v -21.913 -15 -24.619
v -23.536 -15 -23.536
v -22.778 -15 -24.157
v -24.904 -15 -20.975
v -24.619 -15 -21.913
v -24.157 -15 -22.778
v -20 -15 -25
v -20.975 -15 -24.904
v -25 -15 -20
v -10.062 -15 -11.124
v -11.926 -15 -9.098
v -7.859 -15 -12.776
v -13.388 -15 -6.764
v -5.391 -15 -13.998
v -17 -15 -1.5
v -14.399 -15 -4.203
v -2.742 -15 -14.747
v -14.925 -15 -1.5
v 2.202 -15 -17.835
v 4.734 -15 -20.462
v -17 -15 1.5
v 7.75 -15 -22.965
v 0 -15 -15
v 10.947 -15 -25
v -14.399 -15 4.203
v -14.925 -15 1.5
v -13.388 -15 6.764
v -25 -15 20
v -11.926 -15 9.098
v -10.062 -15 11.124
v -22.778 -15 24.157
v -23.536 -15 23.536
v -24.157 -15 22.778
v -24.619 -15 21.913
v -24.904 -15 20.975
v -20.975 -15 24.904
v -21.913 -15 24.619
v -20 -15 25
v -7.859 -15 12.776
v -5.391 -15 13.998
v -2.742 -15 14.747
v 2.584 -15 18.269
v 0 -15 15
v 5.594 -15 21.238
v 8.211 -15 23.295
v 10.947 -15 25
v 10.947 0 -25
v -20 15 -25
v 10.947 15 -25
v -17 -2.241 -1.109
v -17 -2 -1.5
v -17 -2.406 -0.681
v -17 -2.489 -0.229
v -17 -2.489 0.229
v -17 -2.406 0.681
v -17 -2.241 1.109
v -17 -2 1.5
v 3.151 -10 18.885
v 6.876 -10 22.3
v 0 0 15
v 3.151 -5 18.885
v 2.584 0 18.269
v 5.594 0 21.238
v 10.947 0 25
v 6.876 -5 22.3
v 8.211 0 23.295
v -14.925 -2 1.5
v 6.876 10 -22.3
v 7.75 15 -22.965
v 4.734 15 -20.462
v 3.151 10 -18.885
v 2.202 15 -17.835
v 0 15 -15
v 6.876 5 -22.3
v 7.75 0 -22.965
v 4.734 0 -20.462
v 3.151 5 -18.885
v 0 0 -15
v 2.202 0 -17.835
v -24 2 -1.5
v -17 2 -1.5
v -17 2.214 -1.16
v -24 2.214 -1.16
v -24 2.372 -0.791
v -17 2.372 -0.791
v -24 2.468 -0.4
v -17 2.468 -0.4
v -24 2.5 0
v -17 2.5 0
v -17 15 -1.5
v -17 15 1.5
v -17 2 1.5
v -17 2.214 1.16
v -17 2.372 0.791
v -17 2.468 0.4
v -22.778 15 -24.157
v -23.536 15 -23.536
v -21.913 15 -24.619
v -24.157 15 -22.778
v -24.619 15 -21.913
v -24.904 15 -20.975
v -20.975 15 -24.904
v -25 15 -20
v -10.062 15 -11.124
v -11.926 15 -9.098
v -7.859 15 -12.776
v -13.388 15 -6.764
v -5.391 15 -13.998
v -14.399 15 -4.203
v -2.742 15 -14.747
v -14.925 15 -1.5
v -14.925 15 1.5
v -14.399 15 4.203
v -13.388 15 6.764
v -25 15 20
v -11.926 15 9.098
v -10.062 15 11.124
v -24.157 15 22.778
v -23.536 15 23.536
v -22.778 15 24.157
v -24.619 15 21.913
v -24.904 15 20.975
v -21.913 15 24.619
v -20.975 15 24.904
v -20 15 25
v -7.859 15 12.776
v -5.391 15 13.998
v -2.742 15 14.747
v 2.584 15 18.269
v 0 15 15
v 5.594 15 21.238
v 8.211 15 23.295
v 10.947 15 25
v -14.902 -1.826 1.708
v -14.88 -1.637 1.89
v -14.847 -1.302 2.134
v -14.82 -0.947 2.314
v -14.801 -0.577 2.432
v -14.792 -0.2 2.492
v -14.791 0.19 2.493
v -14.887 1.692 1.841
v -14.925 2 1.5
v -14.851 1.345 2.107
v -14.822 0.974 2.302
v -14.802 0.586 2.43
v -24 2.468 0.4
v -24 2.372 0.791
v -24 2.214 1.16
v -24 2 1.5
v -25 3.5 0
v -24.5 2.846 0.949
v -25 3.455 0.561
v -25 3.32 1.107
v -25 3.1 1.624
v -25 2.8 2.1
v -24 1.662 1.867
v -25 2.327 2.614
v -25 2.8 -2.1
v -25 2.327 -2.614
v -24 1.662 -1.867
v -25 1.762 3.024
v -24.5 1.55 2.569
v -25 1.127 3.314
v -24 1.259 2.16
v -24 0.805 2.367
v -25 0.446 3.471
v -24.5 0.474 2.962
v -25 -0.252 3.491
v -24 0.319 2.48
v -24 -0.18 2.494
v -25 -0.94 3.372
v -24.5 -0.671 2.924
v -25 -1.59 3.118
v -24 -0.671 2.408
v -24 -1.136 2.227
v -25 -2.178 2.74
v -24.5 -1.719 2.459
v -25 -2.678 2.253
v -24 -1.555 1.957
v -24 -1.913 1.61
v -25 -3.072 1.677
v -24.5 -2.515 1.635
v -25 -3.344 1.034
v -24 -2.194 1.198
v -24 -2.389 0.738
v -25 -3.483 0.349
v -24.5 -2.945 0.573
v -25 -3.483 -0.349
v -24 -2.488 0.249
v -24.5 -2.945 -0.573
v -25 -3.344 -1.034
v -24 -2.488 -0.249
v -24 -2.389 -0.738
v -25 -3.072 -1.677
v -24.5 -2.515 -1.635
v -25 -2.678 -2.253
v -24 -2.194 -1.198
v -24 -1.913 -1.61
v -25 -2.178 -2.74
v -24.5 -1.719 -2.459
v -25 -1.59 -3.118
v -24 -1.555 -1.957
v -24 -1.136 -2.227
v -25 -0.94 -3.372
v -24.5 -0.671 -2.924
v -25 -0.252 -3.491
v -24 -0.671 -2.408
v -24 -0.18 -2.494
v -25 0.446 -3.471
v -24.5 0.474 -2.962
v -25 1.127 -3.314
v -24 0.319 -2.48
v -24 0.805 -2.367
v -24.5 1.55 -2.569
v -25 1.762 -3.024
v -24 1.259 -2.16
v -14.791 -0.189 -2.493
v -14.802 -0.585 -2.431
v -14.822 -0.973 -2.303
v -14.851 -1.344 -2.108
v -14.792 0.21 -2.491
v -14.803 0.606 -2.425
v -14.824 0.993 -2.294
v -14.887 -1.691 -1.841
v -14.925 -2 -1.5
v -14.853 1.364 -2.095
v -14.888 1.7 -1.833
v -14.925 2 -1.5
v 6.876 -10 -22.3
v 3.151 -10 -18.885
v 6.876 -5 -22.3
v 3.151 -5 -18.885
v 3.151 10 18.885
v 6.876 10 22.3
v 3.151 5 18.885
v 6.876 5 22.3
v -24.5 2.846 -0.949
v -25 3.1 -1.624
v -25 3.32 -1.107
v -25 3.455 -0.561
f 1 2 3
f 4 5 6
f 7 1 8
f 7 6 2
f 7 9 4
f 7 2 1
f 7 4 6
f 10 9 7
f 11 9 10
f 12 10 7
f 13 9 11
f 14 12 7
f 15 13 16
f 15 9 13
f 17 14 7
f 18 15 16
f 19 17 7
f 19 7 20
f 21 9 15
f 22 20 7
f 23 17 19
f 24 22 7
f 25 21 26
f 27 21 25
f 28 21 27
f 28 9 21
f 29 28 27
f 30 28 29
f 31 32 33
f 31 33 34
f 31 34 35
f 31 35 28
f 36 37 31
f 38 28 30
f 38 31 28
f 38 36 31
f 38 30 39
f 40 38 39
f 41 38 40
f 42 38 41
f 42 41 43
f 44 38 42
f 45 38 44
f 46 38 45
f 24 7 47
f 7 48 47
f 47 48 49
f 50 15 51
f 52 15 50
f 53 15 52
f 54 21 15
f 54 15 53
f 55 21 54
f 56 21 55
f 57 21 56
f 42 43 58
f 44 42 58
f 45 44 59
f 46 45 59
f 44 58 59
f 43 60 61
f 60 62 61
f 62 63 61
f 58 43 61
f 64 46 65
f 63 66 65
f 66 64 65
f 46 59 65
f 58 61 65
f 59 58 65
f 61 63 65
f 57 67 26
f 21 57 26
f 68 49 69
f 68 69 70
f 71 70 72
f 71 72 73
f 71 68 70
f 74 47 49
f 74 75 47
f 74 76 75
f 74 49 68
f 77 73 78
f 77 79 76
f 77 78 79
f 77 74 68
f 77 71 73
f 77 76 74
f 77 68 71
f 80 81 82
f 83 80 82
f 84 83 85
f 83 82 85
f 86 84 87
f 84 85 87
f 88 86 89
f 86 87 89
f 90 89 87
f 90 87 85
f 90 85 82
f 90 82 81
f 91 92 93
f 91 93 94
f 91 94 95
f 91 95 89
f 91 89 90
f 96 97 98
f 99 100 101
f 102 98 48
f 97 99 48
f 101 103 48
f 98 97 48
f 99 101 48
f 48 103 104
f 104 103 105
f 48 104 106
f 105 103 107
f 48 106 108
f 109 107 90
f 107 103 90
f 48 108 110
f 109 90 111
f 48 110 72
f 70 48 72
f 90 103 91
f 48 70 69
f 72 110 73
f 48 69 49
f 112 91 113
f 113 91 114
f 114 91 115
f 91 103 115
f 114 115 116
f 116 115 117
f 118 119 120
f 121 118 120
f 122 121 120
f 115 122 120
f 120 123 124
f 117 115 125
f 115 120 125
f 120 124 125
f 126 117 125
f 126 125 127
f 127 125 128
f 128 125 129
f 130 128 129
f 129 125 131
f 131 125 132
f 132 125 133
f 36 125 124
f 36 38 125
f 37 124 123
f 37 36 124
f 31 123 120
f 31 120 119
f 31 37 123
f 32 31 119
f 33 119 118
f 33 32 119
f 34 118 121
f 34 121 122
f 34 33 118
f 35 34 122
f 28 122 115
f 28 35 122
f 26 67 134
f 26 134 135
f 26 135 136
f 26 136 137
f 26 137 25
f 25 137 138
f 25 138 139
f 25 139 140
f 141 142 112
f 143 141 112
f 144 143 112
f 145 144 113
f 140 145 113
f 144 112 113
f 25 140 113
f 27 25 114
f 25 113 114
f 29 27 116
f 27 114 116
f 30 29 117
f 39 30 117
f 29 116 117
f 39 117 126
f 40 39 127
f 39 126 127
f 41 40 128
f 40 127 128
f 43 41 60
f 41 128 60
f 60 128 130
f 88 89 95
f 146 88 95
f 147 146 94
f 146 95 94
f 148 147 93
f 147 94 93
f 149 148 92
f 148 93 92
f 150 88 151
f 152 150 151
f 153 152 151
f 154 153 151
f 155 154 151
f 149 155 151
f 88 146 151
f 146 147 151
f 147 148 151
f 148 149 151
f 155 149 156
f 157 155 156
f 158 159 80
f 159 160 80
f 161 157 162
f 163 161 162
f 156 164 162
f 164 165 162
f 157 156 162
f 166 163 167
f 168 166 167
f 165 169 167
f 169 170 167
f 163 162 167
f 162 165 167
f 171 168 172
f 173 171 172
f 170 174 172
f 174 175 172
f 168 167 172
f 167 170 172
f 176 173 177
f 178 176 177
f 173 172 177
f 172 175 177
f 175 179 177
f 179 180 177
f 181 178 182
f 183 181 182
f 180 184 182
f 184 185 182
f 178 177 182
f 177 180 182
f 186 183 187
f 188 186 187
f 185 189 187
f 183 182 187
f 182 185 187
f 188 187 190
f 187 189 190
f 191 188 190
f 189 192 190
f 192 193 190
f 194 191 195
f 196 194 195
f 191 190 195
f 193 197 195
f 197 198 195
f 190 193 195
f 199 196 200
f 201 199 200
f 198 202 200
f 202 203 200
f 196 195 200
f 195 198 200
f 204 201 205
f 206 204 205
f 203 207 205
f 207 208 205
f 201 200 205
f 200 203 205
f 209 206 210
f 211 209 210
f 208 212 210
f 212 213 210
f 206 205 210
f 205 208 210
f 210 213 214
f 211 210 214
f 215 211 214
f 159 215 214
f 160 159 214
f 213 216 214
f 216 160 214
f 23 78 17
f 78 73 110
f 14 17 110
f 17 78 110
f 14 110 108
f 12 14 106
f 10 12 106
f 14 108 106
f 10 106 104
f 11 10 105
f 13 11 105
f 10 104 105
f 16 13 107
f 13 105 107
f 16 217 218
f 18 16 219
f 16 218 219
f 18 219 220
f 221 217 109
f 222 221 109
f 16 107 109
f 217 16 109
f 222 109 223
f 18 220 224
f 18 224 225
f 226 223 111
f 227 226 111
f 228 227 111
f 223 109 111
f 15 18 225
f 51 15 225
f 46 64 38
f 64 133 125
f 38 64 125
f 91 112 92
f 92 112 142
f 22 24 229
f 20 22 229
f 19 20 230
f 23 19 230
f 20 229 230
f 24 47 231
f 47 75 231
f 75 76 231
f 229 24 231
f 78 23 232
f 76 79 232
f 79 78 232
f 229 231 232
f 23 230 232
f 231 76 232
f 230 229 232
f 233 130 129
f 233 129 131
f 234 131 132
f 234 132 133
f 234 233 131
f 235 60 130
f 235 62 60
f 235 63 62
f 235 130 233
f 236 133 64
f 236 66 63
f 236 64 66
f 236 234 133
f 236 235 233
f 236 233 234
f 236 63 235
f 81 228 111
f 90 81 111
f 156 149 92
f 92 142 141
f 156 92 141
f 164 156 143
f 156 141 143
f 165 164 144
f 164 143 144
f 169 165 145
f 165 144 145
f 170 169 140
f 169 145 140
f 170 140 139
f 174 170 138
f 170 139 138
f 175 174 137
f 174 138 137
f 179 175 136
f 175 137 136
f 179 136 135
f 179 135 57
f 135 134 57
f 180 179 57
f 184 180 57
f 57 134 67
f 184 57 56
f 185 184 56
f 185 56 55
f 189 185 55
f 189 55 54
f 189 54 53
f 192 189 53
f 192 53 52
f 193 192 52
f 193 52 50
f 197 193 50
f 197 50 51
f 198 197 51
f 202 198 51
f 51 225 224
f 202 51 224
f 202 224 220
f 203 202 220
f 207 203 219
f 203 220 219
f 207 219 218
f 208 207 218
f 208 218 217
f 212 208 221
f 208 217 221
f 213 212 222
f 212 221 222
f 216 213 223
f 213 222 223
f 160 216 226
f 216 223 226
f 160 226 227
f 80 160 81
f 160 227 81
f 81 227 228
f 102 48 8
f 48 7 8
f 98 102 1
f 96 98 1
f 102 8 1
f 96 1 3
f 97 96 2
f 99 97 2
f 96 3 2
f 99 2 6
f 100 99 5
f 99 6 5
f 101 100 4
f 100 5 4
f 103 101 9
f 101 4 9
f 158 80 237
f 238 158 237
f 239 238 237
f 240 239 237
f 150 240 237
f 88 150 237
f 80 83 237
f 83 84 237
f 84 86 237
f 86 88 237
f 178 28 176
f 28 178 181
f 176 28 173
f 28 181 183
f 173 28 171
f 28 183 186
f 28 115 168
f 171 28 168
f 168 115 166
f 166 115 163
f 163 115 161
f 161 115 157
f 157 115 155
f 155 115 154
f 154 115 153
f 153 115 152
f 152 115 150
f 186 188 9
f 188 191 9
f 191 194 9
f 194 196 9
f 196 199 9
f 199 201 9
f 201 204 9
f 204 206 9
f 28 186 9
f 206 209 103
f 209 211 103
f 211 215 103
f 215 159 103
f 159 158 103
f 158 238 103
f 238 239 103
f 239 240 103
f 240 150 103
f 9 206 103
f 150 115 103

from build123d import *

# Parameters (mm, degrees)
F1_DEPTH      = 15
F1_DEPTH_BACK = 15
F2_R          = 5
F4_DEPTH      = 25.0010001
F5_SIZE       = 1
F6_DEPTH      = 17


with BuildPart() as f1:
    # F0 (on Front) → F1 (new body, two sides)
    with BuildSketch(Plane.XZ) as f1_sk:
        with BuildLine():
            Line((10.947347623, 25), (-25, 25))
            Line((-25, 25), (-25, -25))
            Line((-25, -25), (10.947347623, -25))
            add(Edge.make_bspline(
                [(10.947347623, -25), (6.7776464895, -22.7393775974), (2.7889229832, -19.0392534951), (0, -15)],
                knots=[0.6583166498, 0.6583166498, 0.6583166498, 0.6583166498, 0.7610943584, 0.7610943584, 0.7610943584, 0.7610943584], degree=3))
            ThreePointArc((0, -15), (-15, 0), (0, 15))
            add(Edge.make_bspline(
                [(0, 15), (2.7889229832, 19.0392534951), (6.7776464895, 22.7393775974), (10.947347623, 25)],
                knots=[0, 0, 0, 0, 0.1027777086, 0.1027777086, 0.1027777086, 0.1027777086], degree=3))
        make_face()
    extrude(amount=-F1_DEPTH)
    extrude(f1_sk.sketch, amount=F1_DEPTH_BACK)

    # F2
    f2_edges = [f1.edges().sort_by_distance(p)[0] for p in [
        (-25, 0, 25),
        (-25, 0, -25),
    ]]
    fillet(f2_edges, radius=F2_R)

    # F3 (on Right) → F4 (cut, through all)
    with BuildSketch(Plane.YZ):
        with BuildLine():
            ThreePointArc((2, -1.5), (2.3717082451, -0.790569415), (2.5, 0))
            ThreePointArc((2.5, 0), (2.3717082451, 0.790569415), (2, 1.5))
            Line((2, 1.5), (-2, 1.5))
            ThreePointArc((-2, 1.5), (-2.5, 0), (-2, -1.5))
            Line((-2, -1.5), (2, -1.5))
        make_face()
        with BuildLine():
            ThreePointArc((-2, -1.5), (0, -2.5), (2, -1.5))
            Line((2, -1.5), (-2, -1.5))
        make_face()
        with BuildLine():
            Line((-2, 1.5), (2, 1.5))
            ThreePointArc((2, 1.5), (0, 2.5), (-2, 1.5))
        make_face()
    extrude(amount=-F4_DEPTH, mode=Mode.SUBTRACT)

    # F5
    f5_edges = [f1.edges().sort_by_distance(p)[0] for p in [
        (-25, -2, -1.5),
    ]]
    chamfer(f5_edges, length=F5_SIZE)

    # F3 (on Right) → F6 (cut)
    with BuildSketch(Plane.YZ):
        with BuildLine():
            ThreePointArc((2, 1.5), (2.3717082451, 0.790569415), (2.5, 0))
            ThreePointArc((2.5, 0), (2.3717082451, -0.790569415), (2, -1.5))
            Line((2, -1.5), (15, -1.5))
            Line((15, -1.5), (15, 1.5))
            Line((15, 1.5), (2, 1.5))
        make_face()
        with BuildLine():
            ThreePointArc((-2, -1.5), (-2.5, 0), (-2, 1.5))
            Line((-2, 1.5), (-15, 1.5))
            Line((-15, 1.5), (-15, -1.5))
            Line((-15, -1.5), (-2, -1.5))
        make_face()
    extrude(amount=-F6_DEPTH, mode=Mode.SUBTRACT)


solid = f1.part
